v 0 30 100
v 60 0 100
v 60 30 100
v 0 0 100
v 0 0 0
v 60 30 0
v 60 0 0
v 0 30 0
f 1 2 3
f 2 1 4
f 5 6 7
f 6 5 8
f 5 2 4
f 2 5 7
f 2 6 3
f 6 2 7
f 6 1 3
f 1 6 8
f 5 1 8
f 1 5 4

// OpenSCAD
$fn = 64;

// Parameters
length = 100;          // mm
w = 60;                // mm (X)
h = 30;                // mm (Y)

// Simple representation of a 30x60 aluminum extrusion as a solid bar
cube([w, h, length], center = false);
